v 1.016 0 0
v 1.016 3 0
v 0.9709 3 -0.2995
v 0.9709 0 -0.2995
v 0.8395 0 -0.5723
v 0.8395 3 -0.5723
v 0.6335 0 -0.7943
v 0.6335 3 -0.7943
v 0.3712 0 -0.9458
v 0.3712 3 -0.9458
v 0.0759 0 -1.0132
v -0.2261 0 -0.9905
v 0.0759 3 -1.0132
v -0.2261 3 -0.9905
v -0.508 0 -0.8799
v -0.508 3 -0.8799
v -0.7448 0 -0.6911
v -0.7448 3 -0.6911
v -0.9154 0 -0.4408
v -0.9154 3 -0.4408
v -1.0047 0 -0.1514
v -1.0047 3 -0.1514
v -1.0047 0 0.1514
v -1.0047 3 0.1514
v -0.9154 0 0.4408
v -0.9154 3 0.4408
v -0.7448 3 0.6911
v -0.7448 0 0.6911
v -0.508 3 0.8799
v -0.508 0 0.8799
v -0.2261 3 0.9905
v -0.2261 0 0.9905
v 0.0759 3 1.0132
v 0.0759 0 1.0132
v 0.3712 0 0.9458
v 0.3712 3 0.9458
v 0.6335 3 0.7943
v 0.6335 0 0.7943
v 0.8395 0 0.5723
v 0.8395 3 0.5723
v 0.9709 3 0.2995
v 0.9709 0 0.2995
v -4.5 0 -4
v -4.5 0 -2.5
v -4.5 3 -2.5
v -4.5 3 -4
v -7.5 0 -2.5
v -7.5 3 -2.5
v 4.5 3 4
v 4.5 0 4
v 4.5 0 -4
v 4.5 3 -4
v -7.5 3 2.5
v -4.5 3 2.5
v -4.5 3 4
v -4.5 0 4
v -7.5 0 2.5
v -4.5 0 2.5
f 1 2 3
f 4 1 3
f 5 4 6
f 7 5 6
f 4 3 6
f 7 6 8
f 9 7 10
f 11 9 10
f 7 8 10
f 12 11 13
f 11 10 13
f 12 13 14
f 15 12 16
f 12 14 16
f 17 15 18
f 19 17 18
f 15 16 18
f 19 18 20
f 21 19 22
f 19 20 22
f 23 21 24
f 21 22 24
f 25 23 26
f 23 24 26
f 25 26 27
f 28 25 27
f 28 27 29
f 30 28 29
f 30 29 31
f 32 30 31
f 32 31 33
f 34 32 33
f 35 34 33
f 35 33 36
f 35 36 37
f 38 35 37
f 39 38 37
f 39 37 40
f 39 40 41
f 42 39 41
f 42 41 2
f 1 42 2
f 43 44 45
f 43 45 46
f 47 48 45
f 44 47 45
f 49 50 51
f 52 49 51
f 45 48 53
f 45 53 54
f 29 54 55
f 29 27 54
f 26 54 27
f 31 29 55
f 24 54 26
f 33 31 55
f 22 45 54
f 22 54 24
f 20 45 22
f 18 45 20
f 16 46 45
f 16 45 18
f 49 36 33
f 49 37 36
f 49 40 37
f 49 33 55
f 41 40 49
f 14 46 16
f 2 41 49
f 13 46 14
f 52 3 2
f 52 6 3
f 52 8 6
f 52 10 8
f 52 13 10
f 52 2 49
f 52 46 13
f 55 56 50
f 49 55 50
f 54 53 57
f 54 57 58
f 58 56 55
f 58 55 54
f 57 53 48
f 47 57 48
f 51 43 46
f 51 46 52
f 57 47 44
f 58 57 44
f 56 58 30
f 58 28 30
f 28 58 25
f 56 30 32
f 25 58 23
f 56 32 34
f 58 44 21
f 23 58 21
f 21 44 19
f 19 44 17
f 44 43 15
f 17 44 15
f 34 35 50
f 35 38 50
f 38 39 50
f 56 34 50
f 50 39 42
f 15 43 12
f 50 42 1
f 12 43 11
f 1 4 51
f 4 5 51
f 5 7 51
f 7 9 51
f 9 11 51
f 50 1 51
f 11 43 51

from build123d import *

# Parameters (mm, degrees)
SKETCH1_W           = 9
SKETCH1_H           = 8
BOSS_EXTRUDE1_DEPTH = 3
SKETCH2_W           = 3
SKETCH2_H           = 5
BOSS_EXTRUDE2_DEPTH = 3
SKETCH3_R           = 1.016
CUT_EXTRUDE1_DEPTH  = 4


with BuildPart() as part:
    # Sketch1 → Boss-Extrude1 (new body)
    with BuildSketch(Plane(origin=(0, 0, 0), x_dir=(1, 0, 0), z_dir=(0, 1, 0))):
        Rectangle(SKETCH1_W, SKETCH1_H)
    extrude(amount=BOSS_EXTRUDE1_DEPTH)

    # Sketch2 → Boss-Extrude2 (add)
    with BuildSketch(Plane(origin=(0, 3, 0), x_dir=(1, 0, 0), z_dir=(0, 1, 0))):
        with Locations((-6, 0)):
            Rectangle(SKETCH2_W, SKETCH2_H)
    extrude(amount=-BOSS_EXTRUDE2_DEPTH)

    # Sketch3 → Cut-Extrude1 (cut, through all)
    with BuildSketch(Plane(origin=(0, 3, 0), x_dir=(1, 0, 0), z_dir=(0, 1, 0))):
        Circle(SKETCH3_R)
    extrude(amount=-CUT_EXTRUDE1_DEPTH, mode=Mode.SUBTRACT)


solid = part.part
